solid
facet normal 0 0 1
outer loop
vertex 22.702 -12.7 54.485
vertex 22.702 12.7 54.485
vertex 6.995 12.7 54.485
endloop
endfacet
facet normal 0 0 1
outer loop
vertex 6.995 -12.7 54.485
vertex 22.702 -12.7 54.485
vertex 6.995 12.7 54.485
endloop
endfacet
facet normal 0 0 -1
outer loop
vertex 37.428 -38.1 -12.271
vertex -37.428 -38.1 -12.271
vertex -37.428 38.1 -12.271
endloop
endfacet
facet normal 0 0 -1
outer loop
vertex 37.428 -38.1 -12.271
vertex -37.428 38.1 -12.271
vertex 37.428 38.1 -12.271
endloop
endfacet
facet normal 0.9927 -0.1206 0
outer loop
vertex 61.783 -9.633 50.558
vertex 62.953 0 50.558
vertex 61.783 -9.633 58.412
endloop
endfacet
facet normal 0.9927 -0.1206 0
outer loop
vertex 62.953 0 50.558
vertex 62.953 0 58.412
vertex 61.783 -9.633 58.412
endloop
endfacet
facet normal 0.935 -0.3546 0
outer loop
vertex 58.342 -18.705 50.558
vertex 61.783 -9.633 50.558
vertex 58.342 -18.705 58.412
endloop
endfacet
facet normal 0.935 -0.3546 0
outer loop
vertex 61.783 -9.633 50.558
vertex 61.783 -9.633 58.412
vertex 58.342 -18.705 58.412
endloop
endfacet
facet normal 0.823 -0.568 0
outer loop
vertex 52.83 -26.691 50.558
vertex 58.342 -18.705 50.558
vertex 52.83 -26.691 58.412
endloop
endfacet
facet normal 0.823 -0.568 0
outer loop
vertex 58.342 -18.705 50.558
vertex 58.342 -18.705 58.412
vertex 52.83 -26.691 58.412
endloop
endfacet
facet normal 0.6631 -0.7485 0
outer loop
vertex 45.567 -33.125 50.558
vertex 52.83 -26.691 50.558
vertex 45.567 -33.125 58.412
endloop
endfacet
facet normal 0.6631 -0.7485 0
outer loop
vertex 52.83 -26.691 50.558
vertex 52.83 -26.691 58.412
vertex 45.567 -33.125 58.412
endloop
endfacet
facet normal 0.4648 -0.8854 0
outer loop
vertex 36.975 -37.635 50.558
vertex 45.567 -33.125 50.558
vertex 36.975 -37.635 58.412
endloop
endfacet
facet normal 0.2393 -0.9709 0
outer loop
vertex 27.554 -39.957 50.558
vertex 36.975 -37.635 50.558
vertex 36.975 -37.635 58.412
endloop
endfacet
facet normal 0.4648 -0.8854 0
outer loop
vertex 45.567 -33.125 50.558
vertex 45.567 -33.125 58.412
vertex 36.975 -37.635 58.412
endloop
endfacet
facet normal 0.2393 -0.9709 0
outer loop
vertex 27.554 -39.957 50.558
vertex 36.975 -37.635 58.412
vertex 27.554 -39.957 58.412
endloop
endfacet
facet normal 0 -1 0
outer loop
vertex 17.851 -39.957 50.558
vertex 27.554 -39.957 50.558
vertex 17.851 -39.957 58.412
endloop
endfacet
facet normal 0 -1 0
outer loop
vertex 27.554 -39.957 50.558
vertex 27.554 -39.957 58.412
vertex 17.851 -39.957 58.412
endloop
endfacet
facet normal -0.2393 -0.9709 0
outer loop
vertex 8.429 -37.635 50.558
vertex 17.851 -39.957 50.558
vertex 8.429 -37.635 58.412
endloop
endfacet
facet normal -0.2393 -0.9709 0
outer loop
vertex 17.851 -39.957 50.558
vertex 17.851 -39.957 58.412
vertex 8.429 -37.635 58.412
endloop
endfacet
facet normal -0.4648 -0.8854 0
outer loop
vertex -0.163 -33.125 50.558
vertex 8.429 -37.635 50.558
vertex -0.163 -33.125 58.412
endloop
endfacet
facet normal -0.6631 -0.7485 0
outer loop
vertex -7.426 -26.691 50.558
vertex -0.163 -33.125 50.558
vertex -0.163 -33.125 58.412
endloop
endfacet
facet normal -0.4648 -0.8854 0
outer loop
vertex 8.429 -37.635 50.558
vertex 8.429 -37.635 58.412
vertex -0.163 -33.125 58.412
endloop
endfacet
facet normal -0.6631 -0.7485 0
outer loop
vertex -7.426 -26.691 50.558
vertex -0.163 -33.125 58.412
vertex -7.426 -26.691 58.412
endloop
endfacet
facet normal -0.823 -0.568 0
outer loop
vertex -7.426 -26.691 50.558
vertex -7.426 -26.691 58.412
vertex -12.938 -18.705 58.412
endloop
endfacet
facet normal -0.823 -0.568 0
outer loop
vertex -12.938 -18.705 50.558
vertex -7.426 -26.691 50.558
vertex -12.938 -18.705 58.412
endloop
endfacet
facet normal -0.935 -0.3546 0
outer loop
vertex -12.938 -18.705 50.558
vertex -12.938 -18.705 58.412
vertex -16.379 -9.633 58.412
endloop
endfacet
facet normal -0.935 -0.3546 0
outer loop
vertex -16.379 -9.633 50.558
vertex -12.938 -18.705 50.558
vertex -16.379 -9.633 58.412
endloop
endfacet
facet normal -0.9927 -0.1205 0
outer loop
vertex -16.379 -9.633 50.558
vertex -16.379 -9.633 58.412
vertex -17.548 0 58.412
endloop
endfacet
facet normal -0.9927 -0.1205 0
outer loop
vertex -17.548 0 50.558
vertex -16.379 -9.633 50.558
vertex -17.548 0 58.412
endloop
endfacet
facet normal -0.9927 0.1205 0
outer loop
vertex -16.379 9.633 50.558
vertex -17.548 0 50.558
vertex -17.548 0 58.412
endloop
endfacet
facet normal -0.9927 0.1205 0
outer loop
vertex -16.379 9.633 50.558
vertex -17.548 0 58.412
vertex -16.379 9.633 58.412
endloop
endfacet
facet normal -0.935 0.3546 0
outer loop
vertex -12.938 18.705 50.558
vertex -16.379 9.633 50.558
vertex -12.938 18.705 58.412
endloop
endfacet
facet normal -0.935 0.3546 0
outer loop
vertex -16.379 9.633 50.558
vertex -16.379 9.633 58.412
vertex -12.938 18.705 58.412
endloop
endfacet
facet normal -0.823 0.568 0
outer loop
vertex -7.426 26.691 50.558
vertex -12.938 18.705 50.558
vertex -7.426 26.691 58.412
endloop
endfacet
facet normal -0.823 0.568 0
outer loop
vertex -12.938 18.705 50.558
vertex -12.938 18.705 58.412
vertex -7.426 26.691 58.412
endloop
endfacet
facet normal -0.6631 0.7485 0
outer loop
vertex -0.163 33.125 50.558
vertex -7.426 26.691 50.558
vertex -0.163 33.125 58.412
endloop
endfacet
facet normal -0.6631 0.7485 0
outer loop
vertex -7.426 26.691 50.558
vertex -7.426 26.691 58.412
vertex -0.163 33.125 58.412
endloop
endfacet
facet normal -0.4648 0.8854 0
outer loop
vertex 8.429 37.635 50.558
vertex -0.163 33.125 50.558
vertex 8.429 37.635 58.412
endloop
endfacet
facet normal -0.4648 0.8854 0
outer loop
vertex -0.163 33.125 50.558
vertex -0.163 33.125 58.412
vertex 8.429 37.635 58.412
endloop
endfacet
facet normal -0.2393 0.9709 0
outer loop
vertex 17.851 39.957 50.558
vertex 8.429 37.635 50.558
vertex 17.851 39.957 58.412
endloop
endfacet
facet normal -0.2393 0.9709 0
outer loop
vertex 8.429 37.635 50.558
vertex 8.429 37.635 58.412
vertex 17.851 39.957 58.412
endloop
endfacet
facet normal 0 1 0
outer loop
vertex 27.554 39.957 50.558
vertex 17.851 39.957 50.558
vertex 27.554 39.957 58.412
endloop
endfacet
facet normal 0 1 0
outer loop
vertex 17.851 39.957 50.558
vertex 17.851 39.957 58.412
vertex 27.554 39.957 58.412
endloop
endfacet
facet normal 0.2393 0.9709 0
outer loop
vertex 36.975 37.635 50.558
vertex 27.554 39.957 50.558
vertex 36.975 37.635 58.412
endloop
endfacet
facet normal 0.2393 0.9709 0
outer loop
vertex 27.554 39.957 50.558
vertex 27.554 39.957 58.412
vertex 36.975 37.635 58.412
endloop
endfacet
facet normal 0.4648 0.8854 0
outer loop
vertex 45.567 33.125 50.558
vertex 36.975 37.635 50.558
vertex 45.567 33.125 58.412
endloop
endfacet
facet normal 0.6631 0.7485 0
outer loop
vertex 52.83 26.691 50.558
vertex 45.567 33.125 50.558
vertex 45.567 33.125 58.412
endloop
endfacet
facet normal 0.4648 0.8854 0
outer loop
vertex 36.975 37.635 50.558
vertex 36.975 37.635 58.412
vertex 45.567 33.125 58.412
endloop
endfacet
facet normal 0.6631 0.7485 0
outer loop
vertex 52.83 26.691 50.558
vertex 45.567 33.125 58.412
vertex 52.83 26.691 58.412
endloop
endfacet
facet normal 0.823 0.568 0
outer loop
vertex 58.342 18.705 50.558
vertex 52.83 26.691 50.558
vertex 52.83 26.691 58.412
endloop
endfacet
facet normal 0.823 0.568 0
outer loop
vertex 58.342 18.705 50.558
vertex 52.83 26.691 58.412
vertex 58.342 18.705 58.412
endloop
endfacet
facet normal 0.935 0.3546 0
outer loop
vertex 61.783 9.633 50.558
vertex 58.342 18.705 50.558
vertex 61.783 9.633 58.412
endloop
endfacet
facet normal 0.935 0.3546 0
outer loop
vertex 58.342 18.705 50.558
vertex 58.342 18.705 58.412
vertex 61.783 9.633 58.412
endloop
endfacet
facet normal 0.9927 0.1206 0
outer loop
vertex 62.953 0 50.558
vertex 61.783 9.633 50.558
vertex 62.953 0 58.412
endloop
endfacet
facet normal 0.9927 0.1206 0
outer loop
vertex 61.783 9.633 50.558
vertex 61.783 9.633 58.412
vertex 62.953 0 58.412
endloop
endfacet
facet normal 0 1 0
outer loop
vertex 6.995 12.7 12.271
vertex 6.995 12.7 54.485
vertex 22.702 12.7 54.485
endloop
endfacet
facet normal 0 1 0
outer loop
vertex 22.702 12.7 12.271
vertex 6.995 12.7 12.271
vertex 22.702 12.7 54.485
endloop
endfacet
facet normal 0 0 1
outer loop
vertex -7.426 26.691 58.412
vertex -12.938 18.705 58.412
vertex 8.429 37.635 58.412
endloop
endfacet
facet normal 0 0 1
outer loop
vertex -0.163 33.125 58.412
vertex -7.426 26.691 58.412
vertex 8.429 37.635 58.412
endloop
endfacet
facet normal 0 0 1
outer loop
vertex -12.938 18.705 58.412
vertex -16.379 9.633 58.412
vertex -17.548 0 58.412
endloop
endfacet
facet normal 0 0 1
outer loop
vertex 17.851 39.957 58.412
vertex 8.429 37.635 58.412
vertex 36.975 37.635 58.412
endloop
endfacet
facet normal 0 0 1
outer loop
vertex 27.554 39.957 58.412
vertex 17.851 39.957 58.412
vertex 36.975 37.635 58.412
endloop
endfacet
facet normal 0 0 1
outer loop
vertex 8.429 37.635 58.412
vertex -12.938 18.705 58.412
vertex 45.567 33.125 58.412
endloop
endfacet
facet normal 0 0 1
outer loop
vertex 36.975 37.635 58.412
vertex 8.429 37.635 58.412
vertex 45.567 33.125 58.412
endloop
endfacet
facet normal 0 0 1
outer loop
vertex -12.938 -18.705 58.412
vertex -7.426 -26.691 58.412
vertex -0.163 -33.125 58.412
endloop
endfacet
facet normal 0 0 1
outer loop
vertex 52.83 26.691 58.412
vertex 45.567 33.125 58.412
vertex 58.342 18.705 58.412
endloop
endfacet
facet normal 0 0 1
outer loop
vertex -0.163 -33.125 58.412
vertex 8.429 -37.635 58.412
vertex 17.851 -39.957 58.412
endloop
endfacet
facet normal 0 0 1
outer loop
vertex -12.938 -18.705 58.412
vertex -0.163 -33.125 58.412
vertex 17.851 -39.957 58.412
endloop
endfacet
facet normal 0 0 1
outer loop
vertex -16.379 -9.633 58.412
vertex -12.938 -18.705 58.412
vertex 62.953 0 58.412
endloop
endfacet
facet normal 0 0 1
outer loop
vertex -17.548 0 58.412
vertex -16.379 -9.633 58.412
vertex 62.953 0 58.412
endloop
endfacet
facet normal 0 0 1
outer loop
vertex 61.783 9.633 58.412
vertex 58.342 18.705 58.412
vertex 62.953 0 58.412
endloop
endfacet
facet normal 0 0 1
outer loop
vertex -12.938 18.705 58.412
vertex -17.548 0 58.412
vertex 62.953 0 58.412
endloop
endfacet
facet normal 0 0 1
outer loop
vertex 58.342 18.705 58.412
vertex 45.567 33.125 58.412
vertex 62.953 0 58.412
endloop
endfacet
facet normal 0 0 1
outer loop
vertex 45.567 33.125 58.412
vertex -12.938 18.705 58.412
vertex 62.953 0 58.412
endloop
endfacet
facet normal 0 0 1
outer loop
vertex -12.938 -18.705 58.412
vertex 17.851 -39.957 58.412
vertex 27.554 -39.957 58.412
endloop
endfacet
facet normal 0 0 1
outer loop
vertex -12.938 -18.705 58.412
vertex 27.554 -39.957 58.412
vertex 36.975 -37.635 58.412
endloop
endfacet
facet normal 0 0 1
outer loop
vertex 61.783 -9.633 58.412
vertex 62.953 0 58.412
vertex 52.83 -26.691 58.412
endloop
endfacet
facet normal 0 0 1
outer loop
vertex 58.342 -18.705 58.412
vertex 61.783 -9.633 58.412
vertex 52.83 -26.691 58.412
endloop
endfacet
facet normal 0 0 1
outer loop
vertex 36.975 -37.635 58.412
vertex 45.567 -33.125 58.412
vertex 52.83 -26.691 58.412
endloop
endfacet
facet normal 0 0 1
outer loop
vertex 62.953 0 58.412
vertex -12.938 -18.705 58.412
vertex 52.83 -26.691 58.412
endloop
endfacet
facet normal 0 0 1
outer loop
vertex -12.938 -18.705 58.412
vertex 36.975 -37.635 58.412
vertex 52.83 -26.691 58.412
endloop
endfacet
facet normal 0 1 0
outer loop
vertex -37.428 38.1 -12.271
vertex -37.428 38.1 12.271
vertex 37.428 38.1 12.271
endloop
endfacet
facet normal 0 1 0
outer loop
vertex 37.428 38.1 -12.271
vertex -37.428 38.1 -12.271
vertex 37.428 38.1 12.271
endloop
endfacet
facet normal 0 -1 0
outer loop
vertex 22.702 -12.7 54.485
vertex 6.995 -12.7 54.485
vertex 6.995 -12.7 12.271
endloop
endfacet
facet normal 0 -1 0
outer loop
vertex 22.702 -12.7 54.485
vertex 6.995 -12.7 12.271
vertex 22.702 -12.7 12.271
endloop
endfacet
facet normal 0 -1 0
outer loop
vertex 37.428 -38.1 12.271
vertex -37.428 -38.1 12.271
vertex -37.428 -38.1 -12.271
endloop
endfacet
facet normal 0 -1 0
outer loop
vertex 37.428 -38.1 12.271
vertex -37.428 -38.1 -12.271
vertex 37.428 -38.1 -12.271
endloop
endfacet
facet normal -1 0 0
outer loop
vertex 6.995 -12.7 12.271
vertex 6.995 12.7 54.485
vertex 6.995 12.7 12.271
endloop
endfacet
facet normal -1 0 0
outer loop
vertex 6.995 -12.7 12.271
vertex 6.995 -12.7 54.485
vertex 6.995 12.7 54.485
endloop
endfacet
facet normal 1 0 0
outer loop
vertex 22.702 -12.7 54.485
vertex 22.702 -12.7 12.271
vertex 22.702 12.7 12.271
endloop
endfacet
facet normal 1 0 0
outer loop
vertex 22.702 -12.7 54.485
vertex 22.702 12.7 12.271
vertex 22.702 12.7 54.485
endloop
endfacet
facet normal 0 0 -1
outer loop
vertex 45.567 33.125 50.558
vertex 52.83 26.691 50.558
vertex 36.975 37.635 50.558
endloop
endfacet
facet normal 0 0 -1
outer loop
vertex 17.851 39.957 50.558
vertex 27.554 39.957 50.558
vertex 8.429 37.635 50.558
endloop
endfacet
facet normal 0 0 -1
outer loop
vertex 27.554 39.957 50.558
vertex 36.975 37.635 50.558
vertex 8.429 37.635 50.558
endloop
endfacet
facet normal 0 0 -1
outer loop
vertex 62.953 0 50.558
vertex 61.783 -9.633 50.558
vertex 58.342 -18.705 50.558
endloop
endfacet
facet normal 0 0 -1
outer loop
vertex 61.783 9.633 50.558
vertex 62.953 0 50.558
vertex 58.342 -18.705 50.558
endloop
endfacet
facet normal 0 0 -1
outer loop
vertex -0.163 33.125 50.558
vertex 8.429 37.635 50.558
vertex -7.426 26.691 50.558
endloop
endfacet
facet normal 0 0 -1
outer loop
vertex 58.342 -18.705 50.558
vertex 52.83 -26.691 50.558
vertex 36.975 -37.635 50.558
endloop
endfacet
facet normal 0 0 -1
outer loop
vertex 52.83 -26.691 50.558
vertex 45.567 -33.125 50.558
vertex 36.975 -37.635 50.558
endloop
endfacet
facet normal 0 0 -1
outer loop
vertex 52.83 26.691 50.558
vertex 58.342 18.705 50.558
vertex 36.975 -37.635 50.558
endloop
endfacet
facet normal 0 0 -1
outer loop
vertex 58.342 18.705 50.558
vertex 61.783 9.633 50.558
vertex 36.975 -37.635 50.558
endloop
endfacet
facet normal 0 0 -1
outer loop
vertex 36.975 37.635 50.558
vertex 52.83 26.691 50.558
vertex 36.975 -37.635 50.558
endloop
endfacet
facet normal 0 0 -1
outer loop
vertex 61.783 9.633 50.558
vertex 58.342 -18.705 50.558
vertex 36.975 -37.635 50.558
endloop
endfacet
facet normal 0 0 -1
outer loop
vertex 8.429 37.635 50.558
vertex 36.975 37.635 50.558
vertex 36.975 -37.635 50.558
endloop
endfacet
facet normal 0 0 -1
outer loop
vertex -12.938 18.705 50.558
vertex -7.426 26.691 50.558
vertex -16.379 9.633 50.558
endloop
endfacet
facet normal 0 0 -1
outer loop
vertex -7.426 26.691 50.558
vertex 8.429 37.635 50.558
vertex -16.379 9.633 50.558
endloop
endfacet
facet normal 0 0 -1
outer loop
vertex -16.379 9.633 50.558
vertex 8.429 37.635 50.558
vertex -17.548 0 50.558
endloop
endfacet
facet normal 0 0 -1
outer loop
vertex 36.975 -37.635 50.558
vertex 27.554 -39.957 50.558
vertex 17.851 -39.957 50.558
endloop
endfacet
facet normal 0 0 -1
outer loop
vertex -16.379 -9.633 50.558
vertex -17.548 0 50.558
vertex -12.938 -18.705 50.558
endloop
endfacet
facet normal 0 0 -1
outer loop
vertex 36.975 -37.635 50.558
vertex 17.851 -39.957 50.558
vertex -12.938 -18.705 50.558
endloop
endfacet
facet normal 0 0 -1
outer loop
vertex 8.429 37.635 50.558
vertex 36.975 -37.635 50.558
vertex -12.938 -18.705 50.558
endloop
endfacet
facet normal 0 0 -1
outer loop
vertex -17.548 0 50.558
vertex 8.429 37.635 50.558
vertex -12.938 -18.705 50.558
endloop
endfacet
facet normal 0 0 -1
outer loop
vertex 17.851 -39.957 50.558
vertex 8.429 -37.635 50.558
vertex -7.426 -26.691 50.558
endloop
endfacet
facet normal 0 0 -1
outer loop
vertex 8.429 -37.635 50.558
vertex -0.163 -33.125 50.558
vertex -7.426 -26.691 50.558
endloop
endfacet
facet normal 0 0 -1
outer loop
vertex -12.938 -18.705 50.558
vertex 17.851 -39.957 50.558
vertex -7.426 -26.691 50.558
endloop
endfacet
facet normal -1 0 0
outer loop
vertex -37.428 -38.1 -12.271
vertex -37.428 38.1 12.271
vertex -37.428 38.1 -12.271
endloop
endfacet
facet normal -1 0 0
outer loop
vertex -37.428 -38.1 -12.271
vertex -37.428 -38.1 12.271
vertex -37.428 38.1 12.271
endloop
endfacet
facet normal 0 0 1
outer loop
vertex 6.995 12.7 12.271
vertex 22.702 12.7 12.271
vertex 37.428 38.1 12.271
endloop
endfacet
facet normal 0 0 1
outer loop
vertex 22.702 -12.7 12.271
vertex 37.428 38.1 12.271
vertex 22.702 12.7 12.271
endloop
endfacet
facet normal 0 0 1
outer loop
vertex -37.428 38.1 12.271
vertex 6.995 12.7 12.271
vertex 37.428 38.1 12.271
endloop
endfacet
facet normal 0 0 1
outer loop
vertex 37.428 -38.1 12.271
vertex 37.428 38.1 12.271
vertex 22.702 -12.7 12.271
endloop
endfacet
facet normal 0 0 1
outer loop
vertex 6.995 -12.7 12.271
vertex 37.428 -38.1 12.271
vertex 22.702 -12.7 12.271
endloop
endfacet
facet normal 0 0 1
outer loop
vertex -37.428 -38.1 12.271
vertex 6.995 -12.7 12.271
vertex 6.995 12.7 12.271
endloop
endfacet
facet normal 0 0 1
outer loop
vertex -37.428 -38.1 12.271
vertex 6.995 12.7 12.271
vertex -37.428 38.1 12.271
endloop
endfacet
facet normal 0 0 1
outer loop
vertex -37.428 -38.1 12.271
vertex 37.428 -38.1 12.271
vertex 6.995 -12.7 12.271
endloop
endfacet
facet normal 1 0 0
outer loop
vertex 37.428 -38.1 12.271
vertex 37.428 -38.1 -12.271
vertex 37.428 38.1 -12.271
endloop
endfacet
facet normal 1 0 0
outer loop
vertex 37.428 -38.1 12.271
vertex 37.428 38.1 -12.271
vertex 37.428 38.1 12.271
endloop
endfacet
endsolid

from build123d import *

# Parameters (mm, degrees)
F1_DEPTH = 38.1
F2_DEPTH = 12.7


with BuildPart() as f1:
    # F0 (on Front) → F1 (new body, symmetric)
    with BuildSketch(Plane.XZ):
        Polygon((6.994743, 12.271473), (-37.427992, 12.271473), (-37.427992, -12.271473), (37.427992, -12.271473), (37.427992, 12.271473), (22.702223, 12.271473), align=None)
    extrude(amount=F1_DEPTH, both=True)

    # F0 (on Front) → F2 (join, symmetric)
    with BuildSketch(Plane.XZ):
        Polygon((6.994743, 54.485336), (6.994743, 12.271473), (22.702223, 12.271473), (22.702223, 50.558463), (22.702223, 54.485336), align=None)
    extrude(amount=F2_DEPTH, both=True)


with BuildPart() as f3:
    # F0 (on Front) → F3 (revolve)
    with BuildSketch(Plane.XZ):
        Polygon((22.702223, 54.485336), (22.702223, 50.558463), (62.952654, 50.558463), (62.952654, 58.412209), (22.702223, 58.412209), align=None)
    revolve(axis=Axis((22.702223, 0, 33.378405), (0, 0, -1)))


solid = Compound([f1.part, f3.part])
